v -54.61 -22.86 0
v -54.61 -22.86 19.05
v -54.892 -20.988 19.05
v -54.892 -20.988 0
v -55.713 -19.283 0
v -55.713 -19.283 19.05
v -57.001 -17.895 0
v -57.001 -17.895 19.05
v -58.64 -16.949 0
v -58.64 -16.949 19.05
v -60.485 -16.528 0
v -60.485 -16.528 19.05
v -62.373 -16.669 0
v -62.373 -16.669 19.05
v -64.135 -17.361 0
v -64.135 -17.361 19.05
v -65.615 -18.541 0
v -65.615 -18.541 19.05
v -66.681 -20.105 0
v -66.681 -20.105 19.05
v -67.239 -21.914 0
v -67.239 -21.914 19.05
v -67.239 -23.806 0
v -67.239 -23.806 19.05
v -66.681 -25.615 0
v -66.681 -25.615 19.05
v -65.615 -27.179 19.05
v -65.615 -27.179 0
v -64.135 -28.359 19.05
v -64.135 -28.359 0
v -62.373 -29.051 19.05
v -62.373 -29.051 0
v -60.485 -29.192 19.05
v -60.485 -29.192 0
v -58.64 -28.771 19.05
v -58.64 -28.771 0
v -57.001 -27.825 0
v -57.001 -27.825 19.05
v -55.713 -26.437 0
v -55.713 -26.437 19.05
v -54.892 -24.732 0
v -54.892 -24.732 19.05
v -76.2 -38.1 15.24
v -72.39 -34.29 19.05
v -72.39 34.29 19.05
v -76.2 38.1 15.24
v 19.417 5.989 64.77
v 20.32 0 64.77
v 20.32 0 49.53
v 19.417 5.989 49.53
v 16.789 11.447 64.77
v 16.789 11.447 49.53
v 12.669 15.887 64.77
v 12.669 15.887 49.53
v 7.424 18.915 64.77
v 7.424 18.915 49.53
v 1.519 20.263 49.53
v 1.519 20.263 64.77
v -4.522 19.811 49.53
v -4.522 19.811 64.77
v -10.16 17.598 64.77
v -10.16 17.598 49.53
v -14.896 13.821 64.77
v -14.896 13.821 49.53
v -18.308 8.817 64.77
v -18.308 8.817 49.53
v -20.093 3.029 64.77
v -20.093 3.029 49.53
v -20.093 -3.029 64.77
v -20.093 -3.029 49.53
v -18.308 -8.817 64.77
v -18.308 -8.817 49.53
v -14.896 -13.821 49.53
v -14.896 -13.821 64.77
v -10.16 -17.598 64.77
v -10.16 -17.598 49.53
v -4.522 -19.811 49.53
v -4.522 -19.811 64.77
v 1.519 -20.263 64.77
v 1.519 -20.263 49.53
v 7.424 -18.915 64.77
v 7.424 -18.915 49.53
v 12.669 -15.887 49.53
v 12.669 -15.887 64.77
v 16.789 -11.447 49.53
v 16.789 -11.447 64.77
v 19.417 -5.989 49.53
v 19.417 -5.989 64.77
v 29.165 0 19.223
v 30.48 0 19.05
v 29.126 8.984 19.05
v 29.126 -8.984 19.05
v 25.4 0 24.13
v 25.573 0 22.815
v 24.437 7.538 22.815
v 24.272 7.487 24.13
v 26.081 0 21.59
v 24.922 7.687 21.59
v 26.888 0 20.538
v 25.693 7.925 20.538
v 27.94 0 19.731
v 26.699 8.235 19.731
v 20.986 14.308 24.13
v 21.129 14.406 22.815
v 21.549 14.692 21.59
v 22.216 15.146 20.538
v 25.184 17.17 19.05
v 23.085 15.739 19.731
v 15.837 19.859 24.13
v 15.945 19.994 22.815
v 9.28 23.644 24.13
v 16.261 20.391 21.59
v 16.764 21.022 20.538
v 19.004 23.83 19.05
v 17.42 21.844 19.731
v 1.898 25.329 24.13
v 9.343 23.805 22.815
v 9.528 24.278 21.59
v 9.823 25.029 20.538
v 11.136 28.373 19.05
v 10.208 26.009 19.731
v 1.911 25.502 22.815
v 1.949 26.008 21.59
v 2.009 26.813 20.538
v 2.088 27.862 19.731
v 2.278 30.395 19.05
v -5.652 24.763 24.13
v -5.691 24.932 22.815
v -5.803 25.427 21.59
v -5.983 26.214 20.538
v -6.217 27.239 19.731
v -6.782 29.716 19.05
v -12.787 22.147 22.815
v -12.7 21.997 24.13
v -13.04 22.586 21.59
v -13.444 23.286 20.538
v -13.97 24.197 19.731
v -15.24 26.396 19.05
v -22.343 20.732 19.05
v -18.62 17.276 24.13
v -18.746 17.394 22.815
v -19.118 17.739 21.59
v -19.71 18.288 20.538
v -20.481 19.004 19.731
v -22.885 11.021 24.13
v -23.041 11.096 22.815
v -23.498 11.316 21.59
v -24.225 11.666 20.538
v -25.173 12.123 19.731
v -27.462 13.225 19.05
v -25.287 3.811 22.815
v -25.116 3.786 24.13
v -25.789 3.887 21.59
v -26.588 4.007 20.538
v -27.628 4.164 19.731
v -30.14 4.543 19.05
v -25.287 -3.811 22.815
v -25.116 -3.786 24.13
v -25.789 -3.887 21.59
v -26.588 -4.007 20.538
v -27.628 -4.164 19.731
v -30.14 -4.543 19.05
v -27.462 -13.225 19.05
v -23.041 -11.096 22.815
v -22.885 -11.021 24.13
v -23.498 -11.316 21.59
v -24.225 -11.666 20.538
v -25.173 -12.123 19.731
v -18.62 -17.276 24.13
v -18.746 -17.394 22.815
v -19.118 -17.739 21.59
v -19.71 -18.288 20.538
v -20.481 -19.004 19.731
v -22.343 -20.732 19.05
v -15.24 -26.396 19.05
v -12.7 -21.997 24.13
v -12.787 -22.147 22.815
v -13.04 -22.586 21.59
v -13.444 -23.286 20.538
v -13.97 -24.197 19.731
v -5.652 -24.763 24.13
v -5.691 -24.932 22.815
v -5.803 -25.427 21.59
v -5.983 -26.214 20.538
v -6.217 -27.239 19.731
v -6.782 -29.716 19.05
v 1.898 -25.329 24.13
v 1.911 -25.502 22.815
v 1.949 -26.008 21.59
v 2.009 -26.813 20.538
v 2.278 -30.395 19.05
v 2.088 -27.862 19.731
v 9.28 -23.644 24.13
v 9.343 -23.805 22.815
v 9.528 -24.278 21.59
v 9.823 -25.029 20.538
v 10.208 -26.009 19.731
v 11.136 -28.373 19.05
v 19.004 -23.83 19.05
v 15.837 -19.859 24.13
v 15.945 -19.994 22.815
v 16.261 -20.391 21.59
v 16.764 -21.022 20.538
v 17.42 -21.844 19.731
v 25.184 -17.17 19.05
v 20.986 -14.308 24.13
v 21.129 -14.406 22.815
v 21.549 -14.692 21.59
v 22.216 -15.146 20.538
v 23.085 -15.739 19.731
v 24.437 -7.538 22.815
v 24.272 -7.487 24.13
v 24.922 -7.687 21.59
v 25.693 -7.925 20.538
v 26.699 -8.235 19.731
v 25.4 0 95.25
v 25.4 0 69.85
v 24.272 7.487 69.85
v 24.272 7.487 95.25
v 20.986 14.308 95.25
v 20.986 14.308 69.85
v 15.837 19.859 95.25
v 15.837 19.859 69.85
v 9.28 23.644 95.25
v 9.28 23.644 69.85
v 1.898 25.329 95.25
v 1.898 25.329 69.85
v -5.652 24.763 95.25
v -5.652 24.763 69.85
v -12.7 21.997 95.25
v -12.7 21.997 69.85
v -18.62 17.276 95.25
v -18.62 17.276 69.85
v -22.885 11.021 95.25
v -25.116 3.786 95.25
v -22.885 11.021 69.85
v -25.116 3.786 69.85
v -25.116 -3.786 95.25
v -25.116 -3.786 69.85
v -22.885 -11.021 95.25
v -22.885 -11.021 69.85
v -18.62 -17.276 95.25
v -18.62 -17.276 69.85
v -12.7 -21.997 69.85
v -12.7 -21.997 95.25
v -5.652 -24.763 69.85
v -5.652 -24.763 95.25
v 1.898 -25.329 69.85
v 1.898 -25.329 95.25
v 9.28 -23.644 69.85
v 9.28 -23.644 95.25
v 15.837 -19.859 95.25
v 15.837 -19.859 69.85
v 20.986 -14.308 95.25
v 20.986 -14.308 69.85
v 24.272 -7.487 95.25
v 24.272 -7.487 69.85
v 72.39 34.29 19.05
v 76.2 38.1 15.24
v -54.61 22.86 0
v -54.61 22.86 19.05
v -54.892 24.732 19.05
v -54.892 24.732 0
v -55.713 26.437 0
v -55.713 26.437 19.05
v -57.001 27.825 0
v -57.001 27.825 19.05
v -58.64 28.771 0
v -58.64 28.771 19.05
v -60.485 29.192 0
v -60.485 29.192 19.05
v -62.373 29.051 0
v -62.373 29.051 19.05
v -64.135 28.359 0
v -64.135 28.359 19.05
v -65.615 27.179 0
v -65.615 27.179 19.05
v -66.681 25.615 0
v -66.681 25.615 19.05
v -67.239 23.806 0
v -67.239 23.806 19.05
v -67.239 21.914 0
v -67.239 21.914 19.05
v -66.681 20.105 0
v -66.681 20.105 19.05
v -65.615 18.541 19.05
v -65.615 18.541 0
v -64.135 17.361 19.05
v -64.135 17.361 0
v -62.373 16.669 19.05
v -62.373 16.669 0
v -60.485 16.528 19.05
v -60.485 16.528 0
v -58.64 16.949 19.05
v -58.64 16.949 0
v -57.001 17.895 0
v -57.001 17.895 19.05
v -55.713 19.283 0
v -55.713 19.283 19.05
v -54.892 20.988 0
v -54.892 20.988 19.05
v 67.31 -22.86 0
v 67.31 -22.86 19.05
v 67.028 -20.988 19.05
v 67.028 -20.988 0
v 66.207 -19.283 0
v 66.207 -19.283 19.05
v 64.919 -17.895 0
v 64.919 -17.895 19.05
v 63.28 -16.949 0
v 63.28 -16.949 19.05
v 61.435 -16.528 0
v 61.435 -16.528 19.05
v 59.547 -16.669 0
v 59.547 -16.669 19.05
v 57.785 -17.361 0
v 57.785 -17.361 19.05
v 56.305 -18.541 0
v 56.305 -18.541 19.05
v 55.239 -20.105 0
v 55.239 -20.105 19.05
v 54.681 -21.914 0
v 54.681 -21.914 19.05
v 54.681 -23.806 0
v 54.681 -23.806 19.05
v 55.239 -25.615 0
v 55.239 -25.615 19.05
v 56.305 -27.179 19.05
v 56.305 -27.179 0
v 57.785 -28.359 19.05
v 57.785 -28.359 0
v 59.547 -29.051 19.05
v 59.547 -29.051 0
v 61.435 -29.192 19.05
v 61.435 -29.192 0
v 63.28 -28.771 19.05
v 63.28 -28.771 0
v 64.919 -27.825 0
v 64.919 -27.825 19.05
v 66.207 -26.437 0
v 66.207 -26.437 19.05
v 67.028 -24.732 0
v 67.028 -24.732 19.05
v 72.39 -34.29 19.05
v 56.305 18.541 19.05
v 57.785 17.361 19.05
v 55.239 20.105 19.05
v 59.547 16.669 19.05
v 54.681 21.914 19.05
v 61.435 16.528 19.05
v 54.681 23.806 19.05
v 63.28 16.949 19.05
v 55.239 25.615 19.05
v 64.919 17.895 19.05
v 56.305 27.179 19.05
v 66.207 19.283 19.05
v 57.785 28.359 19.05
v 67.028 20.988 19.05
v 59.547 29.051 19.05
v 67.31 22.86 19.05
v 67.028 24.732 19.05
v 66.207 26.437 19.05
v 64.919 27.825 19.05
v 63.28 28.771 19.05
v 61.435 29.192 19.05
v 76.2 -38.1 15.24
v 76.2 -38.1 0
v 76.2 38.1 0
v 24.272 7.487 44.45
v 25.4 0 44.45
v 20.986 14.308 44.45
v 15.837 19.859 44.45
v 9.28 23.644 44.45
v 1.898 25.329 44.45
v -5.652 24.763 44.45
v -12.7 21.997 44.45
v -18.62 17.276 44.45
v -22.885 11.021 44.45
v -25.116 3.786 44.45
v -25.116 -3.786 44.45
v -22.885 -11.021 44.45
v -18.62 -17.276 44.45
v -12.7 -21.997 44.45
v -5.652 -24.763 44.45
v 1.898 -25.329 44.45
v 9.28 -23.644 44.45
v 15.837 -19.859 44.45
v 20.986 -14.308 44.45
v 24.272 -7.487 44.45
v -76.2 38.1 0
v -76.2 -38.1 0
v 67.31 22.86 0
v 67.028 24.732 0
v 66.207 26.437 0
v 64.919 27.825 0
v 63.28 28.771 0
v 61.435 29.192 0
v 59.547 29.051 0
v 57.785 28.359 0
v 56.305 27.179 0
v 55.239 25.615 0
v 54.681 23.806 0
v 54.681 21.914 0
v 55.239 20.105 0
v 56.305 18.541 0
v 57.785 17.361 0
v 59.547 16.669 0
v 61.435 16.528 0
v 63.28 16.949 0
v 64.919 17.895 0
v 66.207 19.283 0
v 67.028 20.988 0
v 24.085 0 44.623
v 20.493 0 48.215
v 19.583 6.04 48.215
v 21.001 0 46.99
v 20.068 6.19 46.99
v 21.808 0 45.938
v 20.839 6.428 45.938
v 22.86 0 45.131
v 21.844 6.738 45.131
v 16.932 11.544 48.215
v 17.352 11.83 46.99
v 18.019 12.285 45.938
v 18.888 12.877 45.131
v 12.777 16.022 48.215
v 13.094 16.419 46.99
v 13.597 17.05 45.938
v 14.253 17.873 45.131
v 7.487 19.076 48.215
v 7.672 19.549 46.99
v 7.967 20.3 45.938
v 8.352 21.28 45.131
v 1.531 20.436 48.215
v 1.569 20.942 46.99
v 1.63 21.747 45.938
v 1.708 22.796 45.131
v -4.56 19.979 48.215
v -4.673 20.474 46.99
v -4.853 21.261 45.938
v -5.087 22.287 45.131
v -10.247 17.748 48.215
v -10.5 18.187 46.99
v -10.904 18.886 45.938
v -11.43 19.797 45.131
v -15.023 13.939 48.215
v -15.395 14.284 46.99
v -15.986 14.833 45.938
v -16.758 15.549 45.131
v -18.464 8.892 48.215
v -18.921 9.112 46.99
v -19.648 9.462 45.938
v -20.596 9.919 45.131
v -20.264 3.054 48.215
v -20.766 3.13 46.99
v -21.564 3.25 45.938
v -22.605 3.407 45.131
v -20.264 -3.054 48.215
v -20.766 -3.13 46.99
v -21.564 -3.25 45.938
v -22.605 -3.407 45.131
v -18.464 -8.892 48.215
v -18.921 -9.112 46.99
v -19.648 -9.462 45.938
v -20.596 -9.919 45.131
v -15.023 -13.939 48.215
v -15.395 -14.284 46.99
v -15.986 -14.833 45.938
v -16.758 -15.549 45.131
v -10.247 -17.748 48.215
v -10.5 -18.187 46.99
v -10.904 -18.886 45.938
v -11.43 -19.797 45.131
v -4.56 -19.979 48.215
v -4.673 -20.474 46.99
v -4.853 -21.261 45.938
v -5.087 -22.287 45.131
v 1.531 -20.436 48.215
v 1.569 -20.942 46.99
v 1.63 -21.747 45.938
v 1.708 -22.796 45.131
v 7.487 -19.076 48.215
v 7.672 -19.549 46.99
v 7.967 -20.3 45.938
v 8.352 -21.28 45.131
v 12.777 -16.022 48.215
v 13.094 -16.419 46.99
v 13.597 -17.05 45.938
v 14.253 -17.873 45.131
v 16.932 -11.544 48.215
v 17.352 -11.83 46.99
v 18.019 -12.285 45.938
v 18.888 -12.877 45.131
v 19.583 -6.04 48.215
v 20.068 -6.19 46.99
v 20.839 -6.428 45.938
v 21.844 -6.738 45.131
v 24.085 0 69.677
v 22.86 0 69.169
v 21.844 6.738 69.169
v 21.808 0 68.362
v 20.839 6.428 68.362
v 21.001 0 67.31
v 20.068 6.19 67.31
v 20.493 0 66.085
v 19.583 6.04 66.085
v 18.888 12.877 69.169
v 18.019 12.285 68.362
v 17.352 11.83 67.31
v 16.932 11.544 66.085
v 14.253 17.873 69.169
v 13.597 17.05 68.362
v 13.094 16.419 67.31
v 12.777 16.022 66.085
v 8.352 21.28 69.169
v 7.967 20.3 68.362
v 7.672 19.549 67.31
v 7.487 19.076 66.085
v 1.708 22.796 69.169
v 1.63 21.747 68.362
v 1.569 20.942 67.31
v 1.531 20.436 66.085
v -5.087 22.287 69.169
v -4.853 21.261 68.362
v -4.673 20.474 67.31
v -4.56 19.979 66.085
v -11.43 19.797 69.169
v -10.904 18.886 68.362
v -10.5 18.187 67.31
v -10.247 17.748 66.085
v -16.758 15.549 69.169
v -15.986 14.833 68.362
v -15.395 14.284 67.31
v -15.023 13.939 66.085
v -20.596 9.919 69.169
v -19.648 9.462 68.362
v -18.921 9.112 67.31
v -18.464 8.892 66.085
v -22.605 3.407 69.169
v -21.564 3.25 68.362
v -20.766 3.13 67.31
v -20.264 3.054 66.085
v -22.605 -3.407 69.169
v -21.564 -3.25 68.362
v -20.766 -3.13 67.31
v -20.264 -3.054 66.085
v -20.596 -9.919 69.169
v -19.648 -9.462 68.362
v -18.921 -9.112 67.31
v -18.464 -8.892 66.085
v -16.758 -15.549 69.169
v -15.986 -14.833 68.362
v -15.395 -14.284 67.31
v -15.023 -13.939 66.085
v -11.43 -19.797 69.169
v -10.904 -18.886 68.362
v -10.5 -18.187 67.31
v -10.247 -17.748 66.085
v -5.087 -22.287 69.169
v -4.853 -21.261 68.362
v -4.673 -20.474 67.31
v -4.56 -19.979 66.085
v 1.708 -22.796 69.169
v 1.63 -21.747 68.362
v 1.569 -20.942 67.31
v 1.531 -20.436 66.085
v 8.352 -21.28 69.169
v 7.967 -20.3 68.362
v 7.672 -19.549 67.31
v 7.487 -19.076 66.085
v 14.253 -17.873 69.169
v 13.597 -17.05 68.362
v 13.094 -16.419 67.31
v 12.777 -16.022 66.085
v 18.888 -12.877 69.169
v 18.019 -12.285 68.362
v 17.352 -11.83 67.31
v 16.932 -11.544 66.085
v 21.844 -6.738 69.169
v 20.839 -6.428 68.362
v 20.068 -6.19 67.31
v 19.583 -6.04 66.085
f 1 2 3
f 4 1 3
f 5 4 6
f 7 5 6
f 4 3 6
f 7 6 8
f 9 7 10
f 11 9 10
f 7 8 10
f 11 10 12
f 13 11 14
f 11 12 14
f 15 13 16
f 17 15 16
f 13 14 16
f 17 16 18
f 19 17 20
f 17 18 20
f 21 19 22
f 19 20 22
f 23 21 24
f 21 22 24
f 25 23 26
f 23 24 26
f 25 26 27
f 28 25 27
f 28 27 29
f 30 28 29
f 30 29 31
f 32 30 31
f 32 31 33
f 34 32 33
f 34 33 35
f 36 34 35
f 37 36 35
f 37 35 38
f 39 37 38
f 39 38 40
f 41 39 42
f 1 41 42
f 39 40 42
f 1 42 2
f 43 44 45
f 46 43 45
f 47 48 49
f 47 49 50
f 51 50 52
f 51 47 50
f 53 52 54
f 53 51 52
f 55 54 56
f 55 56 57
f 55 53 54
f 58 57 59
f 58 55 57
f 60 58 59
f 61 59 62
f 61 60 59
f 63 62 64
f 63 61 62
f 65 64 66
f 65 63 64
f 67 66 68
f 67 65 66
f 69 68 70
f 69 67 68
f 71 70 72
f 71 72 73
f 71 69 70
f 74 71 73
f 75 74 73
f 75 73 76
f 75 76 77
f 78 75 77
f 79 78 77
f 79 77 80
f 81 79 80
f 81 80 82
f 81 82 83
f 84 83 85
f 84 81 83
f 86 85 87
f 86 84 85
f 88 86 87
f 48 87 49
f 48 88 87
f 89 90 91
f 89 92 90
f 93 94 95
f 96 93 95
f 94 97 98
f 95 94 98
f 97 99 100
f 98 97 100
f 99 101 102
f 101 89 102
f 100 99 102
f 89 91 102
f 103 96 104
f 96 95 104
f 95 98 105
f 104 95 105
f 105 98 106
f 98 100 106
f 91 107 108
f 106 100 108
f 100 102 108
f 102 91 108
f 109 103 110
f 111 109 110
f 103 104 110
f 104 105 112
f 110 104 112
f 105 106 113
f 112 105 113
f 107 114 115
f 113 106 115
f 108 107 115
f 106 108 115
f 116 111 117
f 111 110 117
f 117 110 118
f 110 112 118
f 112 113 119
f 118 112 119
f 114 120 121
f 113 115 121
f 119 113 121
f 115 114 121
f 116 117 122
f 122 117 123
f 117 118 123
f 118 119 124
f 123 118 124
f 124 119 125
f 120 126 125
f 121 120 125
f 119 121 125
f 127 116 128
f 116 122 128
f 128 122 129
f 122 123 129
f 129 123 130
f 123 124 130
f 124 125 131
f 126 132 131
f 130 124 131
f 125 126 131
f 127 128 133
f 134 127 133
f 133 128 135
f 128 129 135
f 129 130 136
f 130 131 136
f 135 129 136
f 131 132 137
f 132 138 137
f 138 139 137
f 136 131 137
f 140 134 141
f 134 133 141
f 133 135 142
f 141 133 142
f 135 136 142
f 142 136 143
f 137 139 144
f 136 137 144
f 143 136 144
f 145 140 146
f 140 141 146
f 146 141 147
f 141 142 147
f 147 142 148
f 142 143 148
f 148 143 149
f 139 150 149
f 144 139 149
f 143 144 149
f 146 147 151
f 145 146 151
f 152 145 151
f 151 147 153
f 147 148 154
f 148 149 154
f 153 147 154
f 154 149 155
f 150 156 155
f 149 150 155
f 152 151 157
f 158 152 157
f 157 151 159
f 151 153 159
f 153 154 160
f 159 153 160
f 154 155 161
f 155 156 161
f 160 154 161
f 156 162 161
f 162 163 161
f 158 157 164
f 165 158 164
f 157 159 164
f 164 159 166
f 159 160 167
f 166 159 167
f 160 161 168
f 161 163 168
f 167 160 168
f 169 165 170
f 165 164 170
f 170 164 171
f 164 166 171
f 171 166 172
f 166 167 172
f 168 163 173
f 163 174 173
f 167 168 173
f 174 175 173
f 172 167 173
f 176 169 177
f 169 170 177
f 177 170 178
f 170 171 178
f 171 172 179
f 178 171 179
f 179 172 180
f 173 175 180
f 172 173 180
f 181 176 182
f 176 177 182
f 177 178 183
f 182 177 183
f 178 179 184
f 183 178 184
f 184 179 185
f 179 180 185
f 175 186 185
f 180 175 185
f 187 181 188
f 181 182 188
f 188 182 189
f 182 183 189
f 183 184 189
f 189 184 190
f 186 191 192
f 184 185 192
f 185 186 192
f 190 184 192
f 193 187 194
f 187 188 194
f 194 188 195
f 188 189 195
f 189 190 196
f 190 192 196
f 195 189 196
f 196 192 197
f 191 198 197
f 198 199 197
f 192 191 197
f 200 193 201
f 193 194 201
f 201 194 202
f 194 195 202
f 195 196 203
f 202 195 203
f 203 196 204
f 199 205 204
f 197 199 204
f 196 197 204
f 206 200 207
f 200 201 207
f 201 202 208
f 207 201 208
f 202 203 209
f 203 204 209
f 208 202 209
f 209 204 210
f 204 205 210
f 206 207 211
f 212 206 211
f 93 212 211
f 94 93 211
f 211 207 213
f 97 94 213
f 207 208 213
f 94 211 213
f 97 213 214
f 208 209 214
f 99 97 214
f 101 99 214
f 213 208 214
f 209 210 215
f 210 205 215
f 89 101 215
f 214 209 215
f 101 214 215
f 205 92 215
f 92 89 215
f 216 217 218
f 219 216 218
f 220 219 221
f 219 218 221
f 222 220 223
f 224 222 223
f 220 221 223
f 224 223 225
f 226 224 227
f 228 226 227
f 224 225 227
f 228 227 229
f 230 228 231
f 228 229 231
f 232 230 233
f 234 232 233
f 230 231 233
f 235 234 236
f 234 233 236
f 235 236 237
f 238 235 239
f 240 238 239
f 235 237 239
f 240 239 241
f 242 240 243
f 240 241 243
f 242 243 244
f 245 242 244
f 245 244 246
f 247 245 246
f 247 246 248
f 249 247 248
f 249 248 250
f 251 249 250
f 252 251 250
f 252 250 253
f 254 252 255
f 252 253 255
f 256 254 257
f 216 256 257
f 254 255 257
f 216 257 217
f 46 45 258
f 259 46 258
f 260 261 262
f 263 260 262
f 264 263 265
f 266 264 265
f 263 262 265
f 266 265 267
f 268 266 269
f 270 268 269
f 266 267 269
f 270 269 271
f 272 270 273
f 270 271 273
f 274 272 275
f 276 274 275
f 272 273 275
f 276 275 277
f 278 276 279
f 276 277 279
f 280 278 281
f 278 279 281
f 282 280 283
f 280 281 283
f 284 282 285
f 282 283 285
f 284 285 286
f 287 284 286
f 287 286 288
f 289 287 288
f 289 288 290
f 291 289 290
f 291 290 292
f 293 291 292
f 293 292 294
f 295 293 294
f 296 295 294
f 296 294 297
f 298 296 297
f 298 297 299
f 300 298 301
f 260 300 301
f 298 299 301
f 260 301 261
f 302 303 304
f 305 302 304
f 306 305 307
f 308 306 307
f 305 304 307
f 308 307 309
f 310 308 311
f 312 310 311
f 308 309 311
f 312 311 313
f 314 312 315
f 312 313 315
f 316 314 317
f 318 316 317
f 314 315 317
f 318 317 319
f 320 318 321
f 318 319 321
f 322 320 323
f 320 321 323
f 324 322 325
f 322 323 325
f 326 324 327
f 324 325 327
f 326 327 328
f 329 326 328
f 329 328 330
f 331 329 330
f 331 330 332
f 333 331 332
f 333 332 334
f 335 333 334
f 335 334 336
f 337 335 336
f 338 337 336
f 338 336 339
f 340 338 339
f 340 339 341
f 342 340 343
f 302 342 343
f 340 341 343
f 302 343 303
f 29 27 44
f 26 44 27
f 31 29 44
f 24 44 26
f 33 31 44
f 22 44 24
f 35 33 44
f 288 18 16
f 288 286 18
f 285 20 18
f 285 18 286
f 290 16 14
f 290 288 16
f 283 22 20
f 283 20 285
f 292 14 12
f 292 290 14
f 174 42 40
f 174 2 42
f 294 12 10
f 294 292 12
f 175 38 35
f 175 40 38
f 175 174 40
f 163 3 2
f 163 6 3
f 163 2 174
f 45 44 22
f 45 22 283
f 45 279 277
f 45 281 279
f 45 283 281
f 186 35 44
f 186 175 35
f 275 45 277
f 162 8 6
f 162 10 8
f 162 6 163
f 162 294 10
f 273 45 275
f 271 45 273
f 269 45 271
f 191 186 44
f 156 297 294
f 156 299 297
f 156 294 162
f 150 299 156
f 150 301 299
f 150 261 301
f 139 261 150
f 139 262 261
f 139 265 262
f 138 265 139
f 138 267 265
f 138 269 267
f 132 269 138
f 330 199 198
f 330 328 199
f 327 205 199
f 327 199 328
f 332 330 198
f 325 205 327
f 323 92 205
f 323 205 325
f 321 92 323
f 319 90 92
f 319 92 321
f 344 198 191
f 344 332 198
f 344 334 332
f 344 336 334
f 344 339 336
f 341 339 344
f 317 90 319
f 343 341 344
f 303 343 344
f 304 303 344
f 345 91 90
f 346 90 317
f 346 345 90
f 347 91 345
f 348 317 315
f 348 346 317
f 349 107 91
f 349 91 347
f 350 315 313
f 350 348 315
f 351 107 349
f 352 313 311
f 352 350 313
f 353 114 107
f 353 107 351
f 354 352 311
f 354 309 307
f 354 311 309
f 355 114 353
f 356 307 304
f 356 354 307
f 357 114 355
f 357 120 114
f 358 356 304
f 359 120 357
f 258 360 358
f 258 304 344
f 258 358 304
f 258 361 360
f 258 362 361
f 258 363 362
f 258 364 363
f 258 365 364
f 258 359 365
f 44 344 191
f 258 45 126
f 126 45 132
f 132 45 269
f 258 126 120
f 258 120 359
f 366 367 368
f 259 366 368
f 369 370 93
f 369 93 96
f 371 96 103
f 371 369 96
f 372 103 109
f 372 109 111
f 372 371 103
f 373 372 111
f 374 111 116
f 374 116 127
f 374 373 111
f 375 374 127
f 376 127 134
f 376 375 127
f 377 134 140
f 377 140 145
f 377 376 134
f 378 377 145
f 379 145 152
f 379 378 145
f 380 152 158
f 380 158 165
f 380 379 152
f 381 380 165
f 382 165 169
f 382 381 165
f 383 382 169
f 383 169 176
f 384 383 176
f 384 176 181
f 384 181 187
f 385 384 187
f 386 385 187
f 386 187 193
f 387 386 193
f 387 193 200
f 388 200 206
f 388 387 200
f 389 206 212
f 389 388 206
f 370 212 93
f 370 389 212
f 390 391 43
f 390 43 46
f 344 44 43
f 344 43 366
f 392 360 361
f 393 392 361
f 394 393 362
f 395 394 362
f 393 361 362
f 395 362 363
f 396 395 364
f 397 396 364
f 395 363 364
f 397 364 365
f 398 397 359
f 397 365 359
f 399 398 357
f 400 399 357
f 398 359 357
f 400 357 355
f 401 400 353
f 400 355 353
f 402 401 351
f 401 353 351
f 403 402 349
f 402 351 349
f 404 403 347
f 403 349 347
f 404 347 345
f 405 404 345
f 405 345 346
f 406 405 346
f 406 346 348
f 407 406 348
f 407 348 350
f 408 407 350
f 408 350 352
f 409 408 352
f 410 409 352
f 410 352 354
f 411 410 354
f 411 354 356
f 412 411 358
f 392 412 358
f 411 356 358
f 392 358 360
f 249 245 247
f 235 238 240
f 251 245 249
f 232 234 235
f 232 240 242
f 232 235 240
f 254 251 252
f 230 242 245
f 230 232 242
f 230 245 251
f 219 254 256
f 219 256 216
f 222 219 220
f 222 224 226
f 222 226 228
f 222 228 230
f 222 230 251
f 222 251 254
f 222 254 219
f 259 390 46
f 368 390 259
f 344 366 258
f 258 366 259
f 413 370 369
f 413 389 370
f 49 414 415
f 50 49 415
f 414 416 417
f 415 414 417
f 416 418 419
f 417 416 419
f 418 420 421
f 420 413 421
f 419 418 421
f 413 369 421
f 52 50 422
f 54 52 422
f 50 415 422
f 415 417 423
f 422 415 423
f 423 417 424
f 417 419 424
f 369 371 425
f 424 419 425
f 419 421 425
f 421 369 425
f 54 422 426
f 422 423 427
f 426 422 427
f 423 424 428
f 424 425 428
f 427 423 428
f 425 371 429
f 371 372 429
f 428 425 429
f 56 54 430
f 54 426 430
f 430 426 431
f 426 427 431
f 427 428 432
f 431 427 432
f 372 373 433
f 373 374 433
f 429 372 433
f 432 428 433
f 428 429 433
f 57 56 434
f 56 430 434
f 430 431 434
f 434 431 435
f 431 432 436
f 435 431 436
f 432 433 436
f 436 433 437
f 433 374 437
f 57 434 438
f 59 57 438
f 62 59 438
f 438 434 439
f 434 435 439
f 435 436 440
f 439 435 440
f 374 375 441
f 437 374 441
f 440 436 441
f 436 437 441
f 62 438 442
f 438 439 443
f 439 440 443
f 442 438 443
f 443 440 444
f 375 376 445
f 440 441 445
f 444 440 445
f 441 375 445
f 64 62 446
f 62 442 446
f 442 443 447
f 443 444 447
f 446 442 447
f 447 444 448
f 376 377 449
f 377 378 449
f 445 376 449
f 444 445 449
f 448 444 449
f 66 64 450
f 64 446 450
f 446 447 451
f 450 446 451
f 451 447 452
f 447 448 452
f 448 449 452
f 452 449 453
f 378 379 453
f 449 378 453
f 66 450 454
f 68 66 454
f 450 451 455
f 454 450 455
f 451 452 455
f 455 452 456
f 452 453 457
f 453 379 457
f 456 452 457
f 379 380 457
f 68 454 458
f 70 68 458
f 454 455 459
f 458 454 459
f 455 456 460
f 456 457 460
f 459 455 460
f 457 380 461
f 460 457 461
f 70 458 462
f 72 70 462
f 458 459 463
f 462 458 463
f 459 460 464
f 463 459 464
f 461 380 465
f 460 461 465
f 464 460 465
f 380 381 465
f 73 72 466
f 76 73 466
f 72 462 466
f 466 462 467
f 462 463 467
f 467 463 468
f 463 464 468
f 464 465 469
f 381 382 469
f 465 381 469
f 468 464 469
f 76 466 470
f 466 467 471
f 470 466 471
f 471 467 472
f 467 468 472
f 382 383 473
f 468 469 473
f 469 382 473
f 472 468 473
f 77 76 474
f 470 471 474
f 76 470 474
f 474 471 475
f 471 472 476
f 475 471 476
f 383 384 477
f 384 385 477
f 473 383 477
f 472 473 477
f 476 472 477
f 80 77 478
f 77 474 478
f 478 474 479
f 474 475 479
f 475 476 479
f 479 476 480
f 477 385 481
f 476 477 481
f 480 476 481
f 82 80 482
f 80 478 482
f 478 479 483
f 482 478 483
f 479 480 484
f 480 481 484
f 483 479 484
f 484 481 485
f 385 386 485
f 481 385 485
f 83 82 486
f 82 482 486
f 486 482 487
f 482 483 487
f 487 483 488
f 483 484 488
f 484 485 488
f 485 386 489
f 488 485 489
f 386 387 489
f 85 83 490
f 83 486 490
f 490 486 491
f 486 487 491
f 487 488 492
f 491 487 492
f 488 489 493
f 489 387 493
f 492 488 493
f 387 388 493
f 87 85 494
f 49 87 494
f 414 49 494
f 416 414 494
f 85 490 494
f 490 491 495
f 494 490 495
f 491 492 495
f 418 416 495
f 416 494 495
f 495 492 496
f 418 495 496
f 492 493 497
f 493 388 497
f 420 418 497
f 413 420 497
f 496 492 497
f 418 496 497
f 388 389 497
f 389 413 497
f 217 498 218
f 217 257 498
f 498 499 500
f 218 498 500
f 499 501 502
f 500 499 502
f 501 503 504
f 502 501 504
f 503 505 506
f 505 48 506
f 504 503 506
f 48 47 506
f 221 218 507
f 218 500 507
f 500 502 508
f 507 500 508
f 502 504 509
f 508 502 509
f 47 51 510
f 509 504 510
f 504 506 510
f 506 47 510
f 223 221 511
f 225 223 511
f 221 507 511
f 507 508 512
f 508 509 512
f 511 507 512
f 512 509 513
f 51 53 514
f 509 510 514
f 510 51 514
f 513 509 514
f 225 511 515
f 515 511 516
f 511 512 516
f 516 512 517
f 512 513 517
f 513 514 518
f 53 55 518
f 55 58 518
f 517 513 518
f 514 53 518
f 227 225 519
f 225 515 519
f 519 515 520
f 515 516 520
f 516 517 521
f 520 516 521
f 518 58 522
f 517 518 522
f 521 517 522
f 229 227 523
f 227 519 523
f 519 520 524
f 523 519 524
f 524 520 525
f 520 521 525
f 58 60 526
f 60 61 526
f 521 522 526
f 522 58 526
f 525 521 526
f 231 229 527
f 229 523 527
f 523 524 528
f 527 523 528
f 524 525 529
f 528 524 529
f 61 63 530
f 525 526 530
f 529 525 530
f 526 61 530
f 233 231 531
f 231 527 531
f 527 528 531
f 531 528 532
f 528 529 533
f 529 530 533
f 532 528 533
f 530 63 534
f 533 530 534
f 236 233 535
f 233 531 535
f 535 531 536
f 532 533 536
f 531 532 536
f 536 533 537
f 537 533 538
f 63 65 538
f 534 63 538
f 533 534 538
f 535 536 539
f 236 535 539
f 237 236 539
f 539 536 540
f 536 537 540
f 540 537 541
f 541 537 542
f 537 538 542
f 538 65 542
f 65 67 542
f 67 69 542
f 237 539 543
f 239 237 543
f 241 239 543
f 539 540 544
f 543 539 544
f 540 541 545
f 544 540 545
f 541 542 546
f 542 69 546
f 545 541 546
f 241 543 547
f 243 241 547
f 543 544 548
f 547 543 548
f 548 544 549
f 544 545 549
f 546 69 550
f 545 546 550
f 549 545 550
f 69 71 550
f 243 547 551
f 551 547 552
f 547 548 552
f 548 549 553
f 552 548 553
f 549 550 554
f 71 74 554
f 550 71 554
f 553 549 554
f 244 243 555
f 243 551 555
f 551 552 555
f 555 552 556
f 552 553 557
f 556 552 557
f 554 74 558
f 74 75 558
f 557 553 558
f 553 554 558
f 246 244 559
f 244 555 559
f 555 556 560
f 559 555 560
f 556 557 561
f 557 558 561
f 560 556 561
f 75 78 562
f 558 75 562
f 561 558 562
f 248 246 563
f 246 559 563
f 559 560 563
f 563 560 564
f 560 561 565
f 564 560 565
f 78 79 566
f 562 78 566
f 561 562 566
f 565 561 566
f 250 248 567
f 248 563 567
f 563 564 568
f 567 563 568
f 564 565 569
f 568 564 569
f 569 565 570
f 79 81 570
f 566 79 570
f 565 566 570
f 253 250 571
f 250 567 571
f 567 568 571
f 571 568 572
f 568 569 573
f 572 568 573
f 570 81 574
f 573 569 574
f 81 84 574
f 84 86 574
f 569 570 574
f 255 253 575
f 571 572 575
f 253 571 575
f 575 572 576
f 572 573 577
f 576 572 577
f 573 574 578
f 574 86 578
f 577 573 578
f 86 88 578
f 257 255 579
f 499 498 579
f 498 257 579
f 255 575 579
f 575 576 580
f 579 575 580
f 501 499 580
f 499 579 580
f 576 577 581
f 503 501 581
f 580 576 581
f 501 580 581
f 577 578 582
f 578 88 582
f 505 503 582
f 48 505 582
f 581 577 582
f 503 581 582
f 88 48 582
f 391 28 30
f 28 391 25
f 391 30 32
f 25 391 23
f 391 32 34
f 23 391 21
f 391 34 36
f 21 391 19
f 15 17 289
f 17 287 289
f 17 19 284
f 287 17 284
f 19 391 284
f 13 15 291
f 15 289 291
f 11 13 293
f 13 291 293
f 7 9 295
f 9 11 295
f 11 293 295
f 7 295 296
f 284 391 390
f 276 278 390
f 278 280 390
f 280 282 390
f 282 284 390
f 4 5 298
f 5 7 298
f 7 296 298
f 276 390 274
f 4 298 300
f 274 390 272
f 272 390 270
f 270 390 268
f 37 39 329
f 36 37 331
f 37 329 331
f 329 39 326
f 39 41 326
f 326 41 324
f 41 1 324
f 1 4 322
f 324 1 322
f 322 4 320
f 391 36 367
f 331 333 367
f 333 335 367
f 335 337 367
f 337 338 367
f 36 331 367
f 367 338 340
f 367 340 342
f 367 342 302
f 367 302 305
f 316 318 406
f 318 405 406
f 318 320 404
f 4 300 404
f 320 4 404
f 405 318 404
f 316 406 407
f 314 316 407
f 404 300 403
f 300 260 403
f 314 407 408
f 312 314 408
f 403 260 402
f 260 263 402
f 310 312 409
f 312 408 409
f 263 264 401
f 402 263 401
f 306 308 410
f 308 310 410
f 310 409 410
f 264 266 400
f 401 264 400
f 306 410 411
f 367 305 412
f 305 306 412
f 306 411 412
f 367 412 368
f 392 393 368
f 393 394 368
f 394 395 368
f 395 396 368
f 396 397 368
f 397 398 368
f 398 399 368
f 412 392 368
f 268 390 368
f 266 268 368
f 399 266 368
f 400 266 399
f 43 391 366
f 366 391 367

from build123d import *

# Parameters (mm, degrees)
F0_W     = 152.4
F0_H     = 76.2
F1_DEPTH = 19.05
F2_R     = 6.35
F3_DEPTH = 19.05
F4_SIZE  = 3.81
F7_R     = 25.4
F8_DEPTH = 25.4
F9_R     = 5.07999


# Not quite as in the source:
# - a fillet or chamfer is up to 0.001 mm smaller than in the source, because OpenCascade refuses the exact size


with BuildPart() as f1:
    # F0 (on Top) → F1 (new body)
    with BuildSketch(Plane.XY):
        Rectangle(F0_W, F0_H)
    extrude(amount=F1_DEPTH)

    # F2 (on face) → F3 (cut, through all)
    with BuildSketch(Plane.XY.offset(19.05)):
        with Locations((-60.96, 22.86)):
            Circle(F2_R)
        with Locations((-60.96, -22.86)):
            Circle(F2_R)
        with Locations((60.96, 22.86)):
            Circle(F2_R)
        with Locations((60.96, -22.86)):
            Circle(F2_R)
    extrude(amount=-F3_DEPTH, mode=Mode.SUBTRACT)

    # F4
    f4_edges = [f1.edges().sort_by_distance(p)[0] for p in [
        (0, -38.1, 19.05),
        (76.2, 0, 19.05),
        (0, 38.1, 19.05),
        (-76.2, 0, 19.05),
    ]]
    chamfer(f4_edges, length=F4_SIZE)

    # F5 (on Front) → F6 (revolve)
    with BuildSketch(Plane.XZ):
        Polygon((0, 69.85), (0, 19.05), (25.4, 19.05), (25.4, 44.45), (20.32, 44.45), (20.32, 69.85), align=None)
    revolve(axis=Axis((0, 0, 44.45), (0, 0, 1)))

    # F7 (on face) → F8 (join)
    with BuildSketch(Plane.XY.offset(69.85)):
        Circle(F7_R)
    extrude(amount=F8_DEPTH)

    # F9 (radius 5.08 in the source; OpenCascade refuses exactly that, so slightly less here)
    f9_edges = [f1.edges().sort_by_distance(p)[0] for p in [
        (-25.4, 0, 19.05),
        (-20.32, 0, 44.45),
        (-20.32, 0, 69.85),
    ]]
    fillet(f9_edges, radius=F9_R)


solid = f1.part
